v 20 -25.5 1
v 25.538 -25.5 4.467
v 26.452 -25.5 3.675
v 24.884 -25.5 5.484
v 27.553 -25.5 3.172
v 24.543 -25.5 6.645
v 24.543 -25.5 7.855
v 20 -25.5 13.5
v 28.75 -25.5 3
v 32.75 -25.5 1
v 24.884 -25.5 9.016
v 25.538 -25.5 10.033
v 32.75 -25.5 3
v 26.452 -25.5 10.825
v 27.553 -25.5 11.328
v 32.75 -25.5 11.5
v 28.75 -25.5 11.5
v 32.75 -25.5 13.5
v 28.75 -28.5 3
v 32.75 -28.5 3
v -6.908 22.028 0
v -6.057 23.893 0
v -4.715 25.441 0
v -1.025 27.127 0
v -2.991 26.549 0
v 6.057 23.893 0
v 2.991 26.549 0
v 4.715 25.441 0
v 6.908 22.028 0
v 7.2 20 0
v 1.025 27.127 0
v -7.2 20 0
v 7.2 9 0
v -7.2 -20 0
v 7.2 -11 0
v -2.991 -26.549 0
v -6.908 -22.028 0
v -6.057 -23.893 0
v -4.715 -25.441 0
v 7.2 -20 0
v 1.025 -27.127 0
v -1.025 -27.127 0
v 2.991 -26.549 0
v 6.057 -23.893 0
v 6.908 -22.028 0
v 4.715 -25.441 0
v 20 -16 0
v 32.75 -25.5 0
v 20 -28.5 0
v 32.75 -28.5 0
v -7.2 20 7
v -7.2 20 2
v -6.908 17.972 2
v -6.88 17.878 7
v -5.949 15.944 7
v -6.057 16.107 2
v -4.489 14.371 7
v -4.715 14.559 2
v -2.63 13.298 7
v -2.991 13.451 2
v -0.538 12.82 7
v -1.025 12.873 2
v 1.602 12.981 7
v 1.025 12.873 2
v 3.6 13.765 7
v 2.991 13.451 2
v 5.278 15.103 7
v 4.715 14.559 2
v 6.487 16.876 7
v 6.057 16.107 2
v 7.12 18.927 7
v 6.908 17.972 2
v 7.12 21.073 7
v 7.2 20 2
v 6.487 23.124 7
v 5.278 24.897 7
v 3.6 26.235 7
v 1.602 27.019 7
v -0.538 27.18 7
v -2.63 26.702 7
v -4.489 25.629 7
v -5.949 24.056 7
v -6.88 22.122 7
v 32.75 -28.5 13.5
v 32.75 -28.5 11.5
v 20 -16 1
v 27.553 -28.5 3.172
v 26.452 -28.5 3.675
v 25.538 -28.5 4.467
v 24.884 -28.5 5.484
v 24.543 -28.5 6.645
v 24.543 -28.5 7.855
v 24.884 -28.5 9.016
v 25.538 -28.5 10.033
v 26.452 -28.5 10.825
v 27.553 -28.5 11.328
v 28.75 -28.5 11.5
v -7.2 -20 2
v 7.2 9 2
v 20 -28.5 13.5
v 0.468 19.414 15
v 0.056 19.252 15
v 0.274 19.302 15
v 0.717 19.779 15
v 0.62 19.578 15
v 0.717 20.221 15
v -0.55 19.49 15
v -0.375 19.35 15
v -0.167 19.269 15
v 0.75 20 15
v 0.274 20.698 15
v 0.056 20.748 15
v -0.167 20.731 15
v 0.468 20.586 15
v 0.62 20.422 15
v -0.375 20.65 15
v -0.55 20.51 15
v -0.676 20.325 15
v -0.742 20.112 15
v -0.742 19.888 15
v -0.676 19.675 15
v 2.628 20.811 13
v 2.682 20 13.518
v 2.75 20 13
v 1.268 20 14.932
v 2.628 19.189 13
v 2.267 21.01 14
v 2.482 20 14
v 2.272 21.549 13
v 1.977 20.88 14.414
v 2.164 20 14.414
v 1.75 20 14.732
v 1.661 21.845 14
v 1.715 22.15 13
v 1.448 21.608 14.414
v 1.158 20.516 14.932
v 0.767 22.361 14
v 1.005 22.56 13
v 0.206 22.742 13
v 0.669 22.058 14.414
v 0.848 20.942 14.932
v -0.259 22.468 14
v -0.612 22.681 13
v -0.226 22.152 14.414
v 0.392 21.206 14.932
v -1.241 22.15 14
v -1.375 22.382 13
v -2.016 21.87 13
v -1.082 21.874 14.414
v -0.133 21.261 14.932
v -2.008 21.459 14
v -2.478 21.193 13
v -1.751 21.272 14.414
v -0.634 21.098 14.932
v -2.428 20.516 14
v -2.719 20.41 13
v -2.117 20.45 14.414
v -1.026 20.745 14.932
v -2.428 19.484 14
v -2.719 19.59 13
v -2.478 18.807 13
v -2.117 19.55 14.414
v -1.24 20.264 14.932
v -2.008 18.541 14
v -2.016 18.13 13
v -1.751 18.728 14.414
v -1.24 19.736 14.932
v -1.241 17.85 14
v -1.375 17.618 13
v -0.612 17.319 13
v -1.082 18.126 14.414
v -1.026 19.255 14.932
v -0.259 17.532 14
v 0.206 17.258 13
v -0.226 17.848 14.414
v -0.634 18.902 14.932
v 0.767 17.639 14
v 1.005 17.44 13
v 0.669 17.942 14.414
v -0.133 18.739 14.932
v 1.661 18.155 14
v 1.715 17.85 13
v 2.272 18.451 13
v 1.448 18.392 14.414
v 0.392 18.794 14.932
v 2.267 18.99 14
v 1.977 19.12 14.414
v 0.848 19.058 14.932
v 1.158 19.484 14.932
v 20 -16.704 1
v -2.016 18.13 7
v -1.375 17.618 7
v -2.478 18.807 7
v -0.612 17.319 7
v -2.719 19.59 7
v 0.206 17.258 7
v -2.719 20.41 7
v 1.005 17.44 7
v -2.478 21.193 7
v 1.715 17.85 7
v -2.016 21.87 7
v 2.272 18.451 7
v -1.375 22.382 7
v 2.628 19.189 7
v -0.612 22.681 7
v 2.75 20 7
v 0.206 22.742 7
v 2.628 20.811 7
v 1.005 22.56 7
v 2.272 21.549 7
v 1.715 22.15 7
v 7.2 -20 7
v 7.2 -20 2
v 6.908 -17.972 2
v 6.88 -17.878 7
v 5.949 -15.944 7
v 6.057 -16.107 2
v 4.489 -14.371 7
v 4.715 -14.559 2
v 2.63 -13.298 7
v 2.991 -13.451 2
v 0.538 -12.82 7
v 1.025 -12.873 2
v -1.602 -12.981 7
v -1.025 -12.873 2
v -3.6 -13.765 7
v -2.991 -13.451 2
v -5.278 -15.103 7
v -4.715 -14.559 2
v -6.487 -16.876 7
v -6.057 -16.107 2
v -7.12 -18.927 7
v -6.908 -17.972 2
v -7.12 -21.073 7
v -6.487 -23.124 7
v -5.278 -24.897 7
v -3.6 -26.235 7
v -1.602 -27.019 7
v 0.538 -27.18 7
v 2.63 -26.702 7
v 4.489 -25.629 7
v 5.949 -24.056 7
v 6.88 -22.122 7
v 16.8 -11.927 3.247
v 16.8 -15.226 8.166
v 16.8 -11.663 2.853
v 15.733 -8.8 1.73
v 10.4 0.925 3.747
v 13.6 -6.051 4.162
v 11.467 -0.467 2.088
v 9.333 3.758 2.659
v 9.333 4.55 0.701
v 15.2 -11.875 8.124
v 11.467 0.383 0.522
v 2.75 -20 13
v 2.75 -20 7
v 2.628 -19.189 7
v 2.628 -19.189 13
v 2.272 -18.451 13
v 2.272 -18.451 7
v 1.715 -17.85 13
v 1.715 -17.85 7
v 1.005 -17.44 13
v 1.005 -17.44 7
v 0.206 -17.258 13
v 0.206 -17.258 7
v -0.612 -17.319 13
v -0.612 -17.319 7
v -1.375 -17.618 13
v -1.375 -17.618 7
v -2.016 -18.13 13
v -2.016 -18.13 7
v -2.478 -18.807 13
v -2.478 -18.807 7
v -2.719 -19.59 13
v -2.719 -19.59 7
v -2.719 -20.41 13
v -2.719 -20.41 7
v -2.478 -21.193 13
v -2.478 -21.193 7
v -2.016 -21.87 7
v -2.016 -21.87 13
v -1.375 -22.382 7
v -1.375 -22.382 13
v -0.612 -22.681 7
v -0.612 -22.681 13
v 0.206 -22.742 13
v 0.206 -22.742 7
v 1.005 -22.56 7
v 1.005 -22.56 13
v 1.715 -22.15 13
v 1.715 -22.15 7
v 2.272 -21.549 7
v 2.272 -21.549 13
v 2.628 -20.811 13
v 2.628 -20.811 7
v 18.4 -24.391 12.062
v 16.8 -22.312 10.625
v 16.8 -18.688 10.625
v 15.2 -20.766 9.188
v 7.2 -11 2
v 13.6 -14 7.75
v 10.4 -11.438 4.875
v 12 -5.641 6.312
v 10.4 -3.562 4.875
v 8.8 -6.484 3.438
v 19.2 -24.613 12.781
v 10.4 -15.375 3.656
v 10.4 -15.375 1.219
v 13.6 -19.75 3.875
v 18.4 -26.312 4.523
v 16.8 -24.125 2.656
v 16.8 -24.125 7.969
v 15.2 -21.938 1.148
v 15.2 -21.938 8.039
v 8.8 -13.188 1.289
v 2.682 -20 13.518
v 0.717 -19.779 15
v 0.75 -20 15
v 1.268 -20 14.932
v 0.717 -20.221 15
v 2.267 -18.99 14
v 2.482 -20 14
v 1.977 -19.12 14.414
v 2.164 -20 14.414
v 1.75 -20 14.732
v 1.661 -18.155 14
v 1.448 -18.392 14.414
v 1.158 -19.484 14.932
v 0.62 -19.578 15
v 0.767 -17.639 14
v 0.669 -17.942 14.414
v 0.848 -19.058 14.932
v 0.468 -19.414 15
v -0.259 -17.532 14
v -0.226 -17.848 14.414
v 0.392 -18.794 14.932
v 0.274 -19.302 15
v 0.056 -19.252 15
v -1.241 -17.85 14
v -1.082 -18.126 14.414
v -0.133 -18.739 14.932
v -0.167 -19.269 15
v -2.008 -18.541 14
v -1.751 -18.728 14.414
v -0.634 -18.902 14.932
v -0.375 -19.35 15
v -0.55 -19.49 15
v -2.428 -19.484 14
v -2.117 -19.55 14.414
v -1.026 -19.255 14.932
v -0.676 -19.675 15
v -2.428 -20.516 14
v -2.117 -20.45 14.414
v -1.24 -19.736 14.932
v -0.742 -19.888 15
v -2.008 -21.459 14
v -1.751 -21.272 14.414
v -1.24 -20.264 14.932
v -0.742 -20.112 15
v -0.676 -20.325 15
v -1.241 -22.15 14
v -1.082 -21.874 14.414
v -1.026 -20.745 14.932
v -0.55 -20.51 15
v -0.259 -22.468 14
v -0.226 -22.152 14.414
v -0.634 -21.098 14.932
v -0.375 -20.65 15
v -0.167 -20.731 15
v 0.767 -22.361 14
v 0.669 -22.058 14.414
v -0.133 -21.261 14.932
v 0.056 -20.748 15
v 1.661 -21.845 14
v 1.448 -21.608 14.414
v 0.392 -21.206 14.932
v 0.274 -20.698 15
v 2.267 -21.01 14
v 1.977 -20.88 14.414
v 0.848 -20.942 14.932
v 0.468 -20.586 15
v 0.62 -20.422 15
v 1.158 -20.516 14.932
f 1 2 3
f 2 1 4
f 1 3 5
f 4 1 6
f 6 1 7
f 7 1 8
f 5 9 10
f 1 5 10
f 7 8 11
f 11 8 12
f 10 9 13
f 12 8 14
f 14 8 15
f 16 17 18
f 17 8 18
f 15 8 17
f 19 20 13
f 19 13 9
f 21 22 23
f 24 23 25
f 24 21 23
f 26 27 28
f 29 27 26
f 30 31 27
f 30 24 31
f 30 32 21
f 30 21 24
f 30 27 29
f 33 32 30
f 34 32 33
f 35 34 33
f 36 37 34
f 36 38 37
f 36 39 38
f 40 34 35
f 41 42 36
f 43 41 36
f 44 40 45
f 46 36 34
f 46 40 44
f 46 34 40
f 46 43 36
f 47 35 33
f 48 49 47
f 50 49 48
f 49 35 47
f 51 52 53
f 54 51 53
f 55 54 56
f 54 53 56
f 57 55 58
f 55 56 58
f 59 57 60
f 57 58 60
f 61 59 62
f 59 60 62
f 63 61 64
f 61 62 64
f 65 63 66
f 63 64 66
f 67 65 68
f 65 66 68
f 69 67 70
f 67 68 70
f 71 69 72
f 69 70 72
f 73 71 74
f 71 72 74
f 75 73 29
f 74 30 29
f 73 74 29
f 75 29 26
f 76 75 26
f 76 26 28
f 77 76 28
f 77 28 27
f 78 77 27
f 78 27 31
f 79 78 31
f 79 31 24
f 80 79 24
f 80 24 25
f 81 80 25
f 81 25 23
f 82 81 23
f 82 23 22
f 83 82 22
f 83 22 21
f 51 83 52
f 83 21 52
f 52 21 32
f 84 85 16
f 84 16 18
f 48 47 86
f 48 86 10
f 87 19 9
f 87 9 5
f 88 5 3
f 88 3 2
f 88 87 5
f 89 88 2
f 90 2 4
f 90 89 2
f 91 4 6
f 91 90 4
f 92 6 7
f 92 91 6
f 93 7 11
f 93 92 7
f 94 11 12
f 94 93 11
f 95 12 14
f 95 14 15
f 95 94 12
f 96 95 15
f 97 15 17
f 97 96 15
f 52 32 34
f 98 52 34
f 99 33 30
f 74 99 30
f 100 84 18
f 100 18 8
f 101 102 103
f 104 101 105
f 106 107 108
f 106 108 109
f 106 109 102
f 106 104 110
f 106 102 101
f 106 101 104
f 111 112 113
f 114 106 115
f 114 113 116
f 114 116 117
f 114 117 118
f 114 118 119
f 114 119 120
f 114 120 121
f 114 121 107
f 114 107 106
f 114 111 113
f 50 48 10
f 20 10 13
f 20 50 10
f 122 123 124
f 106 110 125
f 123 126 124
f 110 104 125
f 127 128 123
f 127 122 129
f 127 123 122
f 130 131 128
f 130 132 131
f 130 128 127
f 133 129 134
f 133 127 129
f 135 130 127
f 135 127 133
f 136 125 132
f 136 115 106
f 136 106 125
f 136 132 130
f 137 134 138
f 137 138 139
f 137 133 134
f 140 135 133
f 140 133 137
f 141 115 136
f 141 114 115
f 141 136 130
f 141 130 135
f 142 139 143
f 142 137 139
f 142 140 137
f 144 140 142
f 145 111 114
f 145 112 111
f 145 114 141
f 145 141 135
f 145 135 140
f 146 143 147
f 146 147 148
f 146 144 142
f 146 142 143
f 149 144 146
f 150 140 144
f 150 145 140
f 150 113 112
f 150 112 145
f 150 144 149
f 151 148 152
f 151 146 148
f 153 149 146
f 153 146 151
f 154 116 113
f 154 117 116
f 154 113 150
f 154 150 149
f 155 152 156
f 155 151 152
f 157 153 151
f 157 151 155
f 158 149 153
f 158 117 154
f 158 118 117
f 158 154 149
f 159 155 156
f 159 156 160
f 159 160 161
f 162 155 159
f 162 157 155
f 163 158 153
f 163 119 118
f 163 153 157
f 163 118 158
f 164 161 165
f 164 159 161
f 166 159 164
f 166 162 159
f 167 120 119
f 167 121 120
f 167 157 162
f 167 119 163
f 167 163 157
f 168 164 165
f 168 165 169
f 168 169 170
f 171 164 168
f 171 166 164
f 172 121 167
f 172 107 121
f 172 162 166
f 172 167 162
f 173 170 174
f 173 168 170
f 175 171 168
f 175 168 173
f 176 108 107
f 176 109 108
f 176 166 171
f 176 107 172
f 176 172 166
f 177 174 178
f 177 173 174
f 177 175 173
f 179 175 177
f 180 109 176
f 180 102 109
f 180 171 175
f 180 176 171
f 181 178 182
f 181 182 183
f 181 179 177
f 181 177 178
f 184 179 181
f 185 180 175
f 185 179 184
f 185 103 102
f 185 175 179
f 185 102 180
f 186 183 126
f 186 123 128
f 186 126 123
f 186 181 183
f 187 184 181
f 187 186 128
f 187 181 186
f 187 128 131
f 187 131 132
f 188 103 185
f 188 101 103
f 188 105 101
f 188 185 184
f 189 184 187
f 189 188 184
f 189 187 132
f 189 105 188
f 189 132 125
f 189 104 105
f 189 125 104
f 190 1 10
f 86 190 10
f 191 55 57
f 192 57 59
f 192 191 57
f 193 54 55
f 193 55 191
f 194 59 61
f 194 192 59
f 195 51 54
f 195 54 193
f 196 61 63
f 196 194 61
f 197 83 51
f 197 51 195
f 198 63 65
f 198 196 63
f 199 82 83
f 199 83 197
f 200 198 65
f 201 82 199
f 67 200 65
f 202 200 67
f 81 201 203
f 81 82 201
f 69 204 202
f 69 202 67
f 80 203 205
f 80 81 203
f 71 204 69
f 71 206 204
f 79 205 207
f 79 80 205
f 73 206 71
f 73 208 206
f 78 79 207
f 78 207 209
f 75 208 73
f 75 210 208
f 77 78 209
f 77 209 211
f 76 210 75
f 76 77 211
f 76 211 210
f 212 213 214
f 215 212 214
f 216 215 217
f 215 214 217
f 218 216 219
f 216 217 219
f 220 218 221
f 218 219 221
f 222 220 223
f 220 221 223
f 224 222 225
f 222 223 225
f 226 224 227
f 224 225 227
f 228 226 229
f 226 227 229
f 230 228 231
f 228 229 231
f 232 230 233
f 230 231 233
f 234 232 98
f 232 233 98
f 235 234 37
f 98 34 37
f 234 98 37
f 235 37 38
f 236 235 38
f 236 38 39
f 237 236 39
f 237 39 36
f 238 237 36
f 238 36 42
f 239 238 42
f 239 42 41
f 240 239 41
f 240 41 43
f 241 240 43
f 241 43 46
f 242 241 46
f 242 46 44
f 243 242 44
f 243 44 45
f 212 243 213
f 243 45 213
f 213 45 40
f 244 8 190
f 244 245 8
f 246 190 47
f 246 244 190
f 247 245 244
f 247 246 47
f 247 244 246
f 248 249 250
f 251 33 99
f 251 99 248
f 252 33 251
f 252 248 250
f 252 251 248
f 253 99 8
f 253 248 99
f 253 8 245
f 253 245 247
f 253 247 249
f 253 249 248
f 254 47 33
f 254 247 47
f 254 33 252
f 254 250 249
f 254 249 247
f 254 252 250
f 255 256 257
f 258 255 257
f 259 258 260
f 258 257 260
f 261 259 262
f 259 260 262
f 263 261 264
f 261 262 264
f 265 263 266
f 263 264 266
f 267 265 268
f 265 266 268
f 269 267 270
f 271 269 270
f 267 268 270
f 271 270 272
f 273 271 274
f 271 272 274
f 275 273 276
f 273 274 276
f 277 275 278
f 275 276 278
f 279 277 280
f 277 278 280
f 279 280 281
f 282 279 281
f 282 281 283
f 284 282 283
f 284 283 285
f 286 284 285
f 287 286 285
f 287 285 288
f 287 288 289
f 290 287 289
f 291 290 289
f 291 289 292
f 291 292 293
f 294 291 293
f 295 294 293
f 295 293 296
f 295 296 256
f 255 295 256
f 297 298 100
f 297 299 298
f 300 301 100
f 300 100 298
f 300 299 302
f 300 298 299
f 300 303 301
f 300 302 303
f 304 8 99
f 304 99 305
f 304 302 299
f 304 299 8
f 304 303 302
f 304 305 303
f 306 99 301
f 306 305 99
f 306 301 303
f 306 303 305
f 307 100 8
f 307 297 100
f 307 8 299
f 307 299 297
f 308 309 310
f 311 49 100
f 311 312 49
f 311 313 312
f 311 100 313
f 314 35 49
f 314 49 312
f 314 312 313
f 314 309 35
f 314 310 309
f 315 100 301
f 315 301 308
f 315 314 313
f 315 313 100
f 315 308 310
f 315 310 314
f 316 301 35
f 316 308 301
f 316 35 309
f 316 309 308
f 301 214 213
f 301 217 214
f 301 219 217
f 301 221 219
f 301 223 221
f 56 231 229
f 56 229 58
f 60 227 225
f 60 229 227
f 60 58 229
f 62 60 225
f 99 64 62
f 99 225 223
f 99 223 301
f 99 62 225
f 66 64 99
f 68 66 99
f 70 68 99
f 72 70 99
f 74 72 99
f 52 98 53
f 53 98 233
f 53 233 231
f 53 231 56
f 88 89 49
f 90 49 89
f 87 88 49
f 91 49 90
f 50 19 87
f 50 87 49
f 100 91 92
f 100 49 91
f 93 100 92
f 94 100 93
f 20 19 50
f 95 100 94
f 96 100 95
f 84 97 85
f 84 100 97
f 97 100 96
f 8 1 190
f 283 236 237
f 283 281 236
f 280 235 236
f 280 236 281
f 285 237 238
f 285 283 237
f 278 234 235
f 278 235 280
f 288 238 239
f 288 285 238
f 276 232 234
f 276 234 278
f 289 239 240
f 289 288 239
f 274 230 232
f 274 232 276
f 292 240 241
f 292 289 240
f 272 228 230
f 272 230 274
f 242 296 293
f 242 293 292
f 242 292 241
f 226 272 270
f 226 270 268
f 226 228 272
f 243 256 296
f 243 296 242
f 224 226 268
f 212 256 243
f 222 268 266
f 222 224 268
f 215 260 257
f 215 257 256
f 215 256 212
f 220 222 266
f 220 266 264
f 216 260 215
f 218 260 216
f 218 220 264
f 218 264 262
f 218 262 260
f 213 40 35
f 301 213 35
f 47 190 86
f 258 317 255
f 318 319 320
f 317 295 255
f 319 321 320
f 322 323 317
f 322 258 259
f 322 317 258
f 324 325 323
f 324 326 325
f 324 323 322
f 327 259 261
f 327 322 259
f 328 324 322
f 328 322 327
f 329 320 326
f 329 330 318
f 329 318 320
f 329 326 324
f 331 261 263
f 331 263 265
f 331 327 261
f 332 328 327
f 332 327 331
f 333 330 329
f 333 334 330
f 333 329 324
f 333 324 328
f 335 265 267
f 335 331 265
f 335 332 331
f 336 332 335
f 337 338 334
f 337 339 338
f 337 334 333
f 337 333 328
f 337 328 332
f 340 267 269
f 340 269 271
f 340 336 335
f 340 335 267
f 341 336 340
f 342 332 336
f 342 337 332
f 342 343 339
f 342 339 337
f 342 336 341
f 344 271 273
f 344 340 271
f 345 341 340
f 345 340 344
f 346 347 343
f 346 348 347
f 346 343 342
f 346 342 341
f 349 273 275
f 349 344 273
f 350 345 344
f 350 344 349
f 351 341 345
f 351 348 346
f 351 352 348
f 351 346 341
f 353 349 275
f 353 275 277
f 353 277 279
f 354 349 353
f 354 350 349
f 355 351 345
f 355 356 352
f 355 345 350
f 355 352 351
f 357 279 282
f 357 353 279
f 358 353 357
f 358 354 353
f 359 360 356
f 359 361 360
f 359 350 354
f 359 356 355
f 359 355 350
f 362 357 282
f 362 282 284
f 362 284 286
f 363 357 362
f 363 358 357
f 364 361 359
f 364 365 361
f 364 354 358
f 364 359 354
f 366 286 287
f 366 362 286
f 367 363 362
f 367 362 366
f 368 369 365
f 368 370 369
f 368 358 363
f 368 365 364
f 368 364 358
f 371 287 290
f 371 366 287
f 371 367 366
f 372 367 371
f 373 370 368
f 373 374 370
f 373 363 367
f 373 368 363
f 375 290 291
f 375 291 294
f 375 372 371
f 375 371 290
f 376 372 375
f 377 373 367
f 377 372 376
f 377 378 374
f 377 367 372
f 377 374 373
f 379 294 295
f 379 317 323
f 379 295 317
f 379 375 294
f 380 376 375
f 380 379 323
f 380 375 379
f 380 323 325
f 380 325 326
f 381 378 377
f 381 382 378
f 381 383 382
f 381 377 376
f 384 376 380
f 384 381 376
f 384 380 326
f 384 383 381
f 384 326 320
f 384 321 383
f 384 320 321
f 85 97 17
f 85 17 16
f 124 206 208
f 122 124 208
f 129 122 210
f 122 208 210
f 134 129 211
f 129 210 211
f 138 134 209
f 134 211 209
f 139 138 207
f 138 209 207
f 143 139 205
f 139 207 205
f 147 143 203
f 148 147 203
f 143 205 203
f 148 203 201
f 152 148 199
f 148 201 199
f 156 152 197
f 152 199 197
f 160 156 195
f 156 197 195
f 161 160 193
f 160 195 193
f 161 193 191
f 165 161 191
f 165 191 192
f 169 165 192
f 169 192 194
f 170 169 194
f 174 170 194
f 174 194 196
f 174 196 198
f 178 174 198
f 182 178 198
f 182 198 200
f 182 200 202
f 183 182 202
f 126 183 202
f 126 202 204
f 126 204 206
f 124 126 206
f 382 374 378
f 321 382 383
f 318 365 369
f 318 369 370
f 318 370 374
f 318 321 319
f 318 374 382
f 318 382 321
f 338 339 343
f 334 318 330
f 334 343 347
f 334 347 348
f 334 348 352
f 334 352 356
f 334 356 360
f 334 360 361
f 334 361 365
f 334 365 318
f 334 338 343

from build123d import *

# Parameters (mm, degrees)
F1_DEPTH  = 2
F2_R      = 2.75
F3_DEPTH  = 13
F6_DEPTH  = 3
F8_W      = 20
F8_H      = 2
F11_DEPTH = 1
F13_DEPTH = 5
F14_R     = 2


with BuildPart() as f1:
    # F0 (on Top) → F1 (new body)
    with BuildSketch(Plane.XY):
        with BuildLine():
            ThreePointArc((7.2, 20), (0, 27.2), (-7.2, 20))
            Line((-7.2, 20), (-7.2, -20))
            ThreePointArc((-7.2, -20), (0, -27.2), (7.2, -20))
            Line((7.2, -20), (7.2, 20))
        make_face()
    extrude(amount=F1_DEPTH)

    # F2 (on face) → F3 (join)
    with BuildSketch(Plane.XY.offset(2)):
        with Locations((0, 20)):
            Circle(F2_R)
        with Locations((0, -20)):
            Circle(F2_R)
    extrude(amount=F3_DEPTH)



with BuildPart() as f6:
    # F5 (on offset) → F6 (new body)
    with BuildSketch(Plane.XZ.offset(28.5)):
        with BuildLine():
            Line((20, 0), (32.75, 0))
            Line((32.75, 0), (32.75, 3))
            Line((32.75, 3), (28.75, 3))
            ThreePointArc((28.75, 3), (24.5, 7.25), (28.75, 11.5))
            Line((28.75, 11.5), (32.75, 11.5))
            Line((32.75, 11.5), (32.75, 13.5))
            Line((32.75, 13.5), (20, 13.5))
            Line((20, 13.5), (20, 0))
        make_face()
    extrude(amount=-F6_DEPTH)


with BuildPart() as f1_1:
    add(f1.part)

    add(f6.part)  # F9 merges F6
    # F7 (on face) → F9 section 0
    with BuildSketch(Plane(origin=(20, 0, 0), x_dir=(0, -1, 0), z_dir=(-1, 0, 0))):
        Polygon((16, 0), (28.5, 0), (28.5, 13.5), (25.5, 13.5), align=None)
    # F8 (on face) → F9 section 1
    with BuildSketch(Plane.YZ.offset(7.2)):
        with Locations((-1, 1)):
            Rectangle(F8_W, F8_H)
    loft()

    # F10 (on face) → F11 (join)
    with BuildSketch(Plane(origin=(0, 0, 0), x_dir=(1, 0, 0), z_dir=(0, 0, -1))):
        Polygon((20, 16), (32.75, 25.5), (20, 25.5), align=None)
    extrude(amount=-F11_DEPTH)

    # F12 (on face) → F13 (join)
    with BuildSketch(Plane.XY.offset(2)):
        with BuildLine():
            ThreePointArc((7.2, 20), (0, 27.2), (-7.2, 20))
            ThreePointArc((-7.2, 20), (0, 12.8), (7.2, 20))
        make_face()
        with BuildLine():
            ThreePointArc((-7.2, -20), (0, -27.2), (7.2, -20))
            ThreePointArc((7.2, -20), (0, -12.8), (-7.2, -20))
        make_face()
    extrude(amount=F13_DEPTH)

    # F14
    f14_edges = [f1_1.edges().sort_by_distance(p)[0] for p in [
        (-2.75, 20, 15),
        (-2.75, -20, 15),
    ]]
    fillet(f14_edges, radius=F14_R)


solid = f1_1.part
